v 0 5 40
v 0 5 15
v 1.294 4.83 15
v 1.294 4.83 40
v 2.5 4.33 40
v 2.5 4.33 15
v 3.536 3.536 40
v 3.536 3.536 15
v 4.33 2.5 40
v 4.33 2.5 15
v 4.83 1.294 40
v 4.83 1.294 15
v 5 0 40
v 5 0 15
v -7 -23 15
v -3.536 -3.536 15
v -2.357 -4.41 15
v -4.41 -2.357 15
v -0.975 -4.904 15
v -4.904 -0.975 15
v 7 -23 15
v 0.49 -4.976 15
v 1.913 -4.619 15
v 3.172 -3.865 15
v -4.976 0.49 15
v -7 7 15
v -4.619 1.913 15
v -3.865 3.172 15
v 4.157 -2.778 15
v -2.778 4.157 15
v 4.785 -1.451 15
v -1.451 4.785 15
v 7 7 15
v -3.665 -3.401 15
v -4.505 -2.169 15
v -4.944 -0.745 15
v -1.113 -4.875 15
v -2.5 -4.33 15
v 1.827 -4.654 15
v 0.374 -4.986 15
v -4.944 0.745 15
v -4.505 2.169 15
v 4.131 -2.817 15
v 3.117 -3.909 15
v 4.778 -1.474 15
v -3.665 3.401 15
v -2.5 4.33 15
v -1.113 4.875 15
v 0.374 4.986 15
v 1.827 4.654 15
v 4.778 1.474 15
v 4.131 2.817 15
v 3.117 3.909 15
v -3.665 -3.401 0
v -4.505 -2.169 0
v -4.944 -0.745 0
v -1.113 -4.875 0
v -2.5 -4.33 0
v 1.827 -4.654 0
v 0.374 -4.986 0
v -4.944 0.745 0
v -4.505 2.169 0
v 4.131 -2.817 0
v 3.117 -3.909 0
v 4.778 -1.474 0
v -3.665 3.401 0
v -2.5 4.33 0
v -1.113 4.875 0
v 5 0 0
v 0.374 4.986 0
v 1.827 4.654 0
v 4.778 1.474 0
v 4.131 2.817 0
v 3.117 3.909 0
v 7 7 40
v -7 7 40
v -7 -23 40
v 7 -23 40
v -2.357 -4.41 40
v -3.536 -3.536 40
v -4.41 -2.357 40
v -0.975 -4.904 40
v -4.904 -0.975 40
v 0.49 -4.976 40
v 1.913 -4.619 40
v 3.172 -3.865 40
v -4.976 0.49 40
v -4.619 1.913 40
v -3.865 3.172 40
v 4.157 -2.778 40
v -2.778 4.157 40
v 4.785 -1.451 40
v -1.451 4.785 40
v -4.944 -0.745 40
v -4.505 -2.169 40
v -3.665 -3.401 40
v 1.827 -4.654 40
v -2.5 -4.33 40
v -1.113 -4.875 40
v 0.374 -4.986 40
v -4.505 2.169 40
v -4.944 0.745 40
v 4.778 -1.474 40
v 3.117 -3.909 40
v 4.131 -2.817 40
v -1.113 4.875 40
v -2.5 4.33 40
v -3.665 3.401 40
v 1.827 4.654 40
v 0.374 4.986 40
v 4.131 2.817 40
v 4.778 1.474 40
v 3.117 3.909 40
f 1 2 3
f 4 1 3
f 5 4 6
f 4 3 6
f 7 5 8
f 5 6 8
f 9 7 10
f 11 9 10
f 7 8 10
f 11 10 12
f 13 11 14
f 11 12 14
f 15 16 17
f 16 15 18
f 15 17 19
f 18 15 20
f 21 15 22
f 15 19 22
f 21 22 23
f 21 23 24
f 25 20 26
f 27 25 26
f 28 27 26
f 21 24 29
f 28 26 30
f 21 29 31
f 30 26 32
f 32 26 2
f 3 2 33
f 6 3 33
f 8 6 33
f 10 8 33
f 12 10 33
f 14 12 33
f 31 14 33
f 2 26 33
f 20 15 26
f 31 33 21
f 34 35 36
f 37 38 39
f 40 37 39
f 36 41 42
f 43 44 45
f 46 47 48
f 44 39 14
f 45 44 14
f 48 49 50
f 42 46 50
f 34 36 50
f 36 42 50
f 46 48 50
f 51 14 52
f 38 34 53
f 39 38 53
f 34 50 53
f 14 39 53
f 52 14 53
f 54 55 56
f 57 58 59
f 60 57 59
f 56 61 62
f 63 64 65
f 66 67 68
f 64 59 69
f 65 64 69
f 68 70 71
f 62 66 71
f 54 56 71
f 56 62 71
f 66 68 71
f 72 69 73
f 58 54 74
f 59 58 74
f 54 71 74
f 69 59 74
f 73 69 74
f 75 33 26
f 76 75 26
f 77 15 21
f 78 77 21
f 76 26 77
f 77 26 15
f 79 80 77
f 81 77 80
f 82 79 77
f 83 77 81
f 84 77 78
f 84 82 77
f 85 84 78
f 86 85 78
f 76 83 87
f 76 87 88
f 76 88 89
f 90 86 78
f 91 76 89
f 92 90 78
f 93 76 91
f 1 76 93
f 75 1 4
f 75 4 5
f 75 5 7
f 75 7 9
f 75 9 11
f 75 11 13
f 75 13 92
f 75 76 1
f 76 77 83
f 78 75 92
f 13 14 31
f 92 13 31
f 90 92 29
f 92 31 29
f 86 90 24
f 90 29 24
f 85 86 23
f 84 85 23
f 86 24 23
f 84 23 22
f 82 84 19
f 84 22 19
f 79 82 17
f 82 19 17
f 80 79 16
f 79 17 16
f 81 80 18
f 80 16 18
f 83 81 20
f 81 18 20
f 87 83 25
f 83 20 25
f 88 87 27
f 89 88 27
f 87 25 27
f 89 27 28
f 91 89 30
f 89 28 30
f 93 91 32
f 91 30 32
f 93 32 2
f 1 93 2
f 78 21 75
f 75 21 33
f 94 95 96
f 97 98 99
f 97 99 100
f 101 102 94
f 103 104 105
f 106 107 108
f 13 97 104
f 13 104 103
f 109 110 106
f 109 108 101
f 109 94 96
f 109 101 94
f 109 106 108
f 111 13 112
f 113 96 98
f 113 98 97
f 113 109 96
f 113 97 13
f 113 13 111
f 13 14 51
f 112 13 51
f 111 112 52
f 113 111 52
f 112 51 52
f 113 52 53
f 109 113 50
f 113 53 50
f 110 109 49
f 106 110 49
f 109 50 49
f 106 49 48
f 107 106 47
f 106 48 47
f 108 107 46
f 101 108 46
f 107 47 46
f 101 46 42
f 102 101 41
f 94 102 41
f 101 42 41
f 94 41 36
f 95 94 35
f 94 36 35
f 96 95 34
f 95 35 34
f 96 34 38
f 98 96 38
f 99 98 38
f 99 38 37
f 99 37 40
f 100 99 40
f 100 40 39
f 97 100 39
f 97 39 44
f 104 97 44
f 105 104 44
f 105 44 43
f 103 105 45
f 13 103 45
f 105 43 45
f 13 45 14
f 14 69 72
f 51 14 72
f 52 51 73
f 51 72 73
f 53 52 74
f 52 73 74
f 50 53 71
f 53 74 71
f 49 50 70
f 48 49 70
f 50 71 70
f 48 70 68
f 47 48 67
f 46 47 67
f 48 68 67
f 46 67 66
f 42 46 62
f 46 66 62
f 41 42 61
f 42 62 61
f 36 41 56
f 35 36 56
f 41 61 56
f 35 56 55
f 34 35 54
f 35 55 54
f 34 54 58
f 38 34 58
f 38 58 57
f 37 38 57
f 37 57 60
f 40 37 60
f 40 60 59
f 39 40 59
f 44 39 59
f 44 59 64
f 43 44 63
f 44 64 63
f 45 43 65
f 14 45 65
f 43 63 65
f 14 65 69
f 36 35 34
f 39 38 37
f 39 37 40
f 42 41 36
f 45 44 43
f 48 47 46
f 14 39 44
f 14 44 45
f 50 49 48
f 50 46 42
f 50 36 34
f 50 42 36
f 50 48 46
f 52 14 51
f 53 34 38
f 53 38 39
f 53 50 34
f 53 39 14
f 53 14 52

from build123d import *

# Parameters (mm, degrees)
F0_R     = 5
F1_DEPTH = 15
F4_DEPTH = 25
F2_R     = 5
F5_DEPTH = 25


with BuildPart() as f1:
    # F0 (on Top) → F1 (new body)
    with BuildSketch(Plane.XY):
        Circle(F0_R)
    extrude(amount=F1_DEPTH)


with BuildPart() as f4:
    # F3 (on face) → F4 (new body)
    with BuildSketch(Plane.XY.offset(15)):
        Polygon((7, 7), (0, 7), (-7, 7), (-7, -23), (7, -23), align=None)
        with BuildLine():
            ThreePointArc((5, 0), (-3.535534, -3.535534), (0, 5))
            ThreePointArc((0, 5), (3.535534, 3.535534), (5, 0))
        make_face(mode=Mode.SUBTRACT)
    extrude(amount=F4_DEPTH)


with BuildPart() as f5:
    # F2 (on face) → F5 (new body)
    with BuildSketch(Plane.XY.offset(15)):
        Circle(F2_R)
    extrude(amount=F5_DEPTH)


solid = Compound([f1.part, f4.part, f5.part])
